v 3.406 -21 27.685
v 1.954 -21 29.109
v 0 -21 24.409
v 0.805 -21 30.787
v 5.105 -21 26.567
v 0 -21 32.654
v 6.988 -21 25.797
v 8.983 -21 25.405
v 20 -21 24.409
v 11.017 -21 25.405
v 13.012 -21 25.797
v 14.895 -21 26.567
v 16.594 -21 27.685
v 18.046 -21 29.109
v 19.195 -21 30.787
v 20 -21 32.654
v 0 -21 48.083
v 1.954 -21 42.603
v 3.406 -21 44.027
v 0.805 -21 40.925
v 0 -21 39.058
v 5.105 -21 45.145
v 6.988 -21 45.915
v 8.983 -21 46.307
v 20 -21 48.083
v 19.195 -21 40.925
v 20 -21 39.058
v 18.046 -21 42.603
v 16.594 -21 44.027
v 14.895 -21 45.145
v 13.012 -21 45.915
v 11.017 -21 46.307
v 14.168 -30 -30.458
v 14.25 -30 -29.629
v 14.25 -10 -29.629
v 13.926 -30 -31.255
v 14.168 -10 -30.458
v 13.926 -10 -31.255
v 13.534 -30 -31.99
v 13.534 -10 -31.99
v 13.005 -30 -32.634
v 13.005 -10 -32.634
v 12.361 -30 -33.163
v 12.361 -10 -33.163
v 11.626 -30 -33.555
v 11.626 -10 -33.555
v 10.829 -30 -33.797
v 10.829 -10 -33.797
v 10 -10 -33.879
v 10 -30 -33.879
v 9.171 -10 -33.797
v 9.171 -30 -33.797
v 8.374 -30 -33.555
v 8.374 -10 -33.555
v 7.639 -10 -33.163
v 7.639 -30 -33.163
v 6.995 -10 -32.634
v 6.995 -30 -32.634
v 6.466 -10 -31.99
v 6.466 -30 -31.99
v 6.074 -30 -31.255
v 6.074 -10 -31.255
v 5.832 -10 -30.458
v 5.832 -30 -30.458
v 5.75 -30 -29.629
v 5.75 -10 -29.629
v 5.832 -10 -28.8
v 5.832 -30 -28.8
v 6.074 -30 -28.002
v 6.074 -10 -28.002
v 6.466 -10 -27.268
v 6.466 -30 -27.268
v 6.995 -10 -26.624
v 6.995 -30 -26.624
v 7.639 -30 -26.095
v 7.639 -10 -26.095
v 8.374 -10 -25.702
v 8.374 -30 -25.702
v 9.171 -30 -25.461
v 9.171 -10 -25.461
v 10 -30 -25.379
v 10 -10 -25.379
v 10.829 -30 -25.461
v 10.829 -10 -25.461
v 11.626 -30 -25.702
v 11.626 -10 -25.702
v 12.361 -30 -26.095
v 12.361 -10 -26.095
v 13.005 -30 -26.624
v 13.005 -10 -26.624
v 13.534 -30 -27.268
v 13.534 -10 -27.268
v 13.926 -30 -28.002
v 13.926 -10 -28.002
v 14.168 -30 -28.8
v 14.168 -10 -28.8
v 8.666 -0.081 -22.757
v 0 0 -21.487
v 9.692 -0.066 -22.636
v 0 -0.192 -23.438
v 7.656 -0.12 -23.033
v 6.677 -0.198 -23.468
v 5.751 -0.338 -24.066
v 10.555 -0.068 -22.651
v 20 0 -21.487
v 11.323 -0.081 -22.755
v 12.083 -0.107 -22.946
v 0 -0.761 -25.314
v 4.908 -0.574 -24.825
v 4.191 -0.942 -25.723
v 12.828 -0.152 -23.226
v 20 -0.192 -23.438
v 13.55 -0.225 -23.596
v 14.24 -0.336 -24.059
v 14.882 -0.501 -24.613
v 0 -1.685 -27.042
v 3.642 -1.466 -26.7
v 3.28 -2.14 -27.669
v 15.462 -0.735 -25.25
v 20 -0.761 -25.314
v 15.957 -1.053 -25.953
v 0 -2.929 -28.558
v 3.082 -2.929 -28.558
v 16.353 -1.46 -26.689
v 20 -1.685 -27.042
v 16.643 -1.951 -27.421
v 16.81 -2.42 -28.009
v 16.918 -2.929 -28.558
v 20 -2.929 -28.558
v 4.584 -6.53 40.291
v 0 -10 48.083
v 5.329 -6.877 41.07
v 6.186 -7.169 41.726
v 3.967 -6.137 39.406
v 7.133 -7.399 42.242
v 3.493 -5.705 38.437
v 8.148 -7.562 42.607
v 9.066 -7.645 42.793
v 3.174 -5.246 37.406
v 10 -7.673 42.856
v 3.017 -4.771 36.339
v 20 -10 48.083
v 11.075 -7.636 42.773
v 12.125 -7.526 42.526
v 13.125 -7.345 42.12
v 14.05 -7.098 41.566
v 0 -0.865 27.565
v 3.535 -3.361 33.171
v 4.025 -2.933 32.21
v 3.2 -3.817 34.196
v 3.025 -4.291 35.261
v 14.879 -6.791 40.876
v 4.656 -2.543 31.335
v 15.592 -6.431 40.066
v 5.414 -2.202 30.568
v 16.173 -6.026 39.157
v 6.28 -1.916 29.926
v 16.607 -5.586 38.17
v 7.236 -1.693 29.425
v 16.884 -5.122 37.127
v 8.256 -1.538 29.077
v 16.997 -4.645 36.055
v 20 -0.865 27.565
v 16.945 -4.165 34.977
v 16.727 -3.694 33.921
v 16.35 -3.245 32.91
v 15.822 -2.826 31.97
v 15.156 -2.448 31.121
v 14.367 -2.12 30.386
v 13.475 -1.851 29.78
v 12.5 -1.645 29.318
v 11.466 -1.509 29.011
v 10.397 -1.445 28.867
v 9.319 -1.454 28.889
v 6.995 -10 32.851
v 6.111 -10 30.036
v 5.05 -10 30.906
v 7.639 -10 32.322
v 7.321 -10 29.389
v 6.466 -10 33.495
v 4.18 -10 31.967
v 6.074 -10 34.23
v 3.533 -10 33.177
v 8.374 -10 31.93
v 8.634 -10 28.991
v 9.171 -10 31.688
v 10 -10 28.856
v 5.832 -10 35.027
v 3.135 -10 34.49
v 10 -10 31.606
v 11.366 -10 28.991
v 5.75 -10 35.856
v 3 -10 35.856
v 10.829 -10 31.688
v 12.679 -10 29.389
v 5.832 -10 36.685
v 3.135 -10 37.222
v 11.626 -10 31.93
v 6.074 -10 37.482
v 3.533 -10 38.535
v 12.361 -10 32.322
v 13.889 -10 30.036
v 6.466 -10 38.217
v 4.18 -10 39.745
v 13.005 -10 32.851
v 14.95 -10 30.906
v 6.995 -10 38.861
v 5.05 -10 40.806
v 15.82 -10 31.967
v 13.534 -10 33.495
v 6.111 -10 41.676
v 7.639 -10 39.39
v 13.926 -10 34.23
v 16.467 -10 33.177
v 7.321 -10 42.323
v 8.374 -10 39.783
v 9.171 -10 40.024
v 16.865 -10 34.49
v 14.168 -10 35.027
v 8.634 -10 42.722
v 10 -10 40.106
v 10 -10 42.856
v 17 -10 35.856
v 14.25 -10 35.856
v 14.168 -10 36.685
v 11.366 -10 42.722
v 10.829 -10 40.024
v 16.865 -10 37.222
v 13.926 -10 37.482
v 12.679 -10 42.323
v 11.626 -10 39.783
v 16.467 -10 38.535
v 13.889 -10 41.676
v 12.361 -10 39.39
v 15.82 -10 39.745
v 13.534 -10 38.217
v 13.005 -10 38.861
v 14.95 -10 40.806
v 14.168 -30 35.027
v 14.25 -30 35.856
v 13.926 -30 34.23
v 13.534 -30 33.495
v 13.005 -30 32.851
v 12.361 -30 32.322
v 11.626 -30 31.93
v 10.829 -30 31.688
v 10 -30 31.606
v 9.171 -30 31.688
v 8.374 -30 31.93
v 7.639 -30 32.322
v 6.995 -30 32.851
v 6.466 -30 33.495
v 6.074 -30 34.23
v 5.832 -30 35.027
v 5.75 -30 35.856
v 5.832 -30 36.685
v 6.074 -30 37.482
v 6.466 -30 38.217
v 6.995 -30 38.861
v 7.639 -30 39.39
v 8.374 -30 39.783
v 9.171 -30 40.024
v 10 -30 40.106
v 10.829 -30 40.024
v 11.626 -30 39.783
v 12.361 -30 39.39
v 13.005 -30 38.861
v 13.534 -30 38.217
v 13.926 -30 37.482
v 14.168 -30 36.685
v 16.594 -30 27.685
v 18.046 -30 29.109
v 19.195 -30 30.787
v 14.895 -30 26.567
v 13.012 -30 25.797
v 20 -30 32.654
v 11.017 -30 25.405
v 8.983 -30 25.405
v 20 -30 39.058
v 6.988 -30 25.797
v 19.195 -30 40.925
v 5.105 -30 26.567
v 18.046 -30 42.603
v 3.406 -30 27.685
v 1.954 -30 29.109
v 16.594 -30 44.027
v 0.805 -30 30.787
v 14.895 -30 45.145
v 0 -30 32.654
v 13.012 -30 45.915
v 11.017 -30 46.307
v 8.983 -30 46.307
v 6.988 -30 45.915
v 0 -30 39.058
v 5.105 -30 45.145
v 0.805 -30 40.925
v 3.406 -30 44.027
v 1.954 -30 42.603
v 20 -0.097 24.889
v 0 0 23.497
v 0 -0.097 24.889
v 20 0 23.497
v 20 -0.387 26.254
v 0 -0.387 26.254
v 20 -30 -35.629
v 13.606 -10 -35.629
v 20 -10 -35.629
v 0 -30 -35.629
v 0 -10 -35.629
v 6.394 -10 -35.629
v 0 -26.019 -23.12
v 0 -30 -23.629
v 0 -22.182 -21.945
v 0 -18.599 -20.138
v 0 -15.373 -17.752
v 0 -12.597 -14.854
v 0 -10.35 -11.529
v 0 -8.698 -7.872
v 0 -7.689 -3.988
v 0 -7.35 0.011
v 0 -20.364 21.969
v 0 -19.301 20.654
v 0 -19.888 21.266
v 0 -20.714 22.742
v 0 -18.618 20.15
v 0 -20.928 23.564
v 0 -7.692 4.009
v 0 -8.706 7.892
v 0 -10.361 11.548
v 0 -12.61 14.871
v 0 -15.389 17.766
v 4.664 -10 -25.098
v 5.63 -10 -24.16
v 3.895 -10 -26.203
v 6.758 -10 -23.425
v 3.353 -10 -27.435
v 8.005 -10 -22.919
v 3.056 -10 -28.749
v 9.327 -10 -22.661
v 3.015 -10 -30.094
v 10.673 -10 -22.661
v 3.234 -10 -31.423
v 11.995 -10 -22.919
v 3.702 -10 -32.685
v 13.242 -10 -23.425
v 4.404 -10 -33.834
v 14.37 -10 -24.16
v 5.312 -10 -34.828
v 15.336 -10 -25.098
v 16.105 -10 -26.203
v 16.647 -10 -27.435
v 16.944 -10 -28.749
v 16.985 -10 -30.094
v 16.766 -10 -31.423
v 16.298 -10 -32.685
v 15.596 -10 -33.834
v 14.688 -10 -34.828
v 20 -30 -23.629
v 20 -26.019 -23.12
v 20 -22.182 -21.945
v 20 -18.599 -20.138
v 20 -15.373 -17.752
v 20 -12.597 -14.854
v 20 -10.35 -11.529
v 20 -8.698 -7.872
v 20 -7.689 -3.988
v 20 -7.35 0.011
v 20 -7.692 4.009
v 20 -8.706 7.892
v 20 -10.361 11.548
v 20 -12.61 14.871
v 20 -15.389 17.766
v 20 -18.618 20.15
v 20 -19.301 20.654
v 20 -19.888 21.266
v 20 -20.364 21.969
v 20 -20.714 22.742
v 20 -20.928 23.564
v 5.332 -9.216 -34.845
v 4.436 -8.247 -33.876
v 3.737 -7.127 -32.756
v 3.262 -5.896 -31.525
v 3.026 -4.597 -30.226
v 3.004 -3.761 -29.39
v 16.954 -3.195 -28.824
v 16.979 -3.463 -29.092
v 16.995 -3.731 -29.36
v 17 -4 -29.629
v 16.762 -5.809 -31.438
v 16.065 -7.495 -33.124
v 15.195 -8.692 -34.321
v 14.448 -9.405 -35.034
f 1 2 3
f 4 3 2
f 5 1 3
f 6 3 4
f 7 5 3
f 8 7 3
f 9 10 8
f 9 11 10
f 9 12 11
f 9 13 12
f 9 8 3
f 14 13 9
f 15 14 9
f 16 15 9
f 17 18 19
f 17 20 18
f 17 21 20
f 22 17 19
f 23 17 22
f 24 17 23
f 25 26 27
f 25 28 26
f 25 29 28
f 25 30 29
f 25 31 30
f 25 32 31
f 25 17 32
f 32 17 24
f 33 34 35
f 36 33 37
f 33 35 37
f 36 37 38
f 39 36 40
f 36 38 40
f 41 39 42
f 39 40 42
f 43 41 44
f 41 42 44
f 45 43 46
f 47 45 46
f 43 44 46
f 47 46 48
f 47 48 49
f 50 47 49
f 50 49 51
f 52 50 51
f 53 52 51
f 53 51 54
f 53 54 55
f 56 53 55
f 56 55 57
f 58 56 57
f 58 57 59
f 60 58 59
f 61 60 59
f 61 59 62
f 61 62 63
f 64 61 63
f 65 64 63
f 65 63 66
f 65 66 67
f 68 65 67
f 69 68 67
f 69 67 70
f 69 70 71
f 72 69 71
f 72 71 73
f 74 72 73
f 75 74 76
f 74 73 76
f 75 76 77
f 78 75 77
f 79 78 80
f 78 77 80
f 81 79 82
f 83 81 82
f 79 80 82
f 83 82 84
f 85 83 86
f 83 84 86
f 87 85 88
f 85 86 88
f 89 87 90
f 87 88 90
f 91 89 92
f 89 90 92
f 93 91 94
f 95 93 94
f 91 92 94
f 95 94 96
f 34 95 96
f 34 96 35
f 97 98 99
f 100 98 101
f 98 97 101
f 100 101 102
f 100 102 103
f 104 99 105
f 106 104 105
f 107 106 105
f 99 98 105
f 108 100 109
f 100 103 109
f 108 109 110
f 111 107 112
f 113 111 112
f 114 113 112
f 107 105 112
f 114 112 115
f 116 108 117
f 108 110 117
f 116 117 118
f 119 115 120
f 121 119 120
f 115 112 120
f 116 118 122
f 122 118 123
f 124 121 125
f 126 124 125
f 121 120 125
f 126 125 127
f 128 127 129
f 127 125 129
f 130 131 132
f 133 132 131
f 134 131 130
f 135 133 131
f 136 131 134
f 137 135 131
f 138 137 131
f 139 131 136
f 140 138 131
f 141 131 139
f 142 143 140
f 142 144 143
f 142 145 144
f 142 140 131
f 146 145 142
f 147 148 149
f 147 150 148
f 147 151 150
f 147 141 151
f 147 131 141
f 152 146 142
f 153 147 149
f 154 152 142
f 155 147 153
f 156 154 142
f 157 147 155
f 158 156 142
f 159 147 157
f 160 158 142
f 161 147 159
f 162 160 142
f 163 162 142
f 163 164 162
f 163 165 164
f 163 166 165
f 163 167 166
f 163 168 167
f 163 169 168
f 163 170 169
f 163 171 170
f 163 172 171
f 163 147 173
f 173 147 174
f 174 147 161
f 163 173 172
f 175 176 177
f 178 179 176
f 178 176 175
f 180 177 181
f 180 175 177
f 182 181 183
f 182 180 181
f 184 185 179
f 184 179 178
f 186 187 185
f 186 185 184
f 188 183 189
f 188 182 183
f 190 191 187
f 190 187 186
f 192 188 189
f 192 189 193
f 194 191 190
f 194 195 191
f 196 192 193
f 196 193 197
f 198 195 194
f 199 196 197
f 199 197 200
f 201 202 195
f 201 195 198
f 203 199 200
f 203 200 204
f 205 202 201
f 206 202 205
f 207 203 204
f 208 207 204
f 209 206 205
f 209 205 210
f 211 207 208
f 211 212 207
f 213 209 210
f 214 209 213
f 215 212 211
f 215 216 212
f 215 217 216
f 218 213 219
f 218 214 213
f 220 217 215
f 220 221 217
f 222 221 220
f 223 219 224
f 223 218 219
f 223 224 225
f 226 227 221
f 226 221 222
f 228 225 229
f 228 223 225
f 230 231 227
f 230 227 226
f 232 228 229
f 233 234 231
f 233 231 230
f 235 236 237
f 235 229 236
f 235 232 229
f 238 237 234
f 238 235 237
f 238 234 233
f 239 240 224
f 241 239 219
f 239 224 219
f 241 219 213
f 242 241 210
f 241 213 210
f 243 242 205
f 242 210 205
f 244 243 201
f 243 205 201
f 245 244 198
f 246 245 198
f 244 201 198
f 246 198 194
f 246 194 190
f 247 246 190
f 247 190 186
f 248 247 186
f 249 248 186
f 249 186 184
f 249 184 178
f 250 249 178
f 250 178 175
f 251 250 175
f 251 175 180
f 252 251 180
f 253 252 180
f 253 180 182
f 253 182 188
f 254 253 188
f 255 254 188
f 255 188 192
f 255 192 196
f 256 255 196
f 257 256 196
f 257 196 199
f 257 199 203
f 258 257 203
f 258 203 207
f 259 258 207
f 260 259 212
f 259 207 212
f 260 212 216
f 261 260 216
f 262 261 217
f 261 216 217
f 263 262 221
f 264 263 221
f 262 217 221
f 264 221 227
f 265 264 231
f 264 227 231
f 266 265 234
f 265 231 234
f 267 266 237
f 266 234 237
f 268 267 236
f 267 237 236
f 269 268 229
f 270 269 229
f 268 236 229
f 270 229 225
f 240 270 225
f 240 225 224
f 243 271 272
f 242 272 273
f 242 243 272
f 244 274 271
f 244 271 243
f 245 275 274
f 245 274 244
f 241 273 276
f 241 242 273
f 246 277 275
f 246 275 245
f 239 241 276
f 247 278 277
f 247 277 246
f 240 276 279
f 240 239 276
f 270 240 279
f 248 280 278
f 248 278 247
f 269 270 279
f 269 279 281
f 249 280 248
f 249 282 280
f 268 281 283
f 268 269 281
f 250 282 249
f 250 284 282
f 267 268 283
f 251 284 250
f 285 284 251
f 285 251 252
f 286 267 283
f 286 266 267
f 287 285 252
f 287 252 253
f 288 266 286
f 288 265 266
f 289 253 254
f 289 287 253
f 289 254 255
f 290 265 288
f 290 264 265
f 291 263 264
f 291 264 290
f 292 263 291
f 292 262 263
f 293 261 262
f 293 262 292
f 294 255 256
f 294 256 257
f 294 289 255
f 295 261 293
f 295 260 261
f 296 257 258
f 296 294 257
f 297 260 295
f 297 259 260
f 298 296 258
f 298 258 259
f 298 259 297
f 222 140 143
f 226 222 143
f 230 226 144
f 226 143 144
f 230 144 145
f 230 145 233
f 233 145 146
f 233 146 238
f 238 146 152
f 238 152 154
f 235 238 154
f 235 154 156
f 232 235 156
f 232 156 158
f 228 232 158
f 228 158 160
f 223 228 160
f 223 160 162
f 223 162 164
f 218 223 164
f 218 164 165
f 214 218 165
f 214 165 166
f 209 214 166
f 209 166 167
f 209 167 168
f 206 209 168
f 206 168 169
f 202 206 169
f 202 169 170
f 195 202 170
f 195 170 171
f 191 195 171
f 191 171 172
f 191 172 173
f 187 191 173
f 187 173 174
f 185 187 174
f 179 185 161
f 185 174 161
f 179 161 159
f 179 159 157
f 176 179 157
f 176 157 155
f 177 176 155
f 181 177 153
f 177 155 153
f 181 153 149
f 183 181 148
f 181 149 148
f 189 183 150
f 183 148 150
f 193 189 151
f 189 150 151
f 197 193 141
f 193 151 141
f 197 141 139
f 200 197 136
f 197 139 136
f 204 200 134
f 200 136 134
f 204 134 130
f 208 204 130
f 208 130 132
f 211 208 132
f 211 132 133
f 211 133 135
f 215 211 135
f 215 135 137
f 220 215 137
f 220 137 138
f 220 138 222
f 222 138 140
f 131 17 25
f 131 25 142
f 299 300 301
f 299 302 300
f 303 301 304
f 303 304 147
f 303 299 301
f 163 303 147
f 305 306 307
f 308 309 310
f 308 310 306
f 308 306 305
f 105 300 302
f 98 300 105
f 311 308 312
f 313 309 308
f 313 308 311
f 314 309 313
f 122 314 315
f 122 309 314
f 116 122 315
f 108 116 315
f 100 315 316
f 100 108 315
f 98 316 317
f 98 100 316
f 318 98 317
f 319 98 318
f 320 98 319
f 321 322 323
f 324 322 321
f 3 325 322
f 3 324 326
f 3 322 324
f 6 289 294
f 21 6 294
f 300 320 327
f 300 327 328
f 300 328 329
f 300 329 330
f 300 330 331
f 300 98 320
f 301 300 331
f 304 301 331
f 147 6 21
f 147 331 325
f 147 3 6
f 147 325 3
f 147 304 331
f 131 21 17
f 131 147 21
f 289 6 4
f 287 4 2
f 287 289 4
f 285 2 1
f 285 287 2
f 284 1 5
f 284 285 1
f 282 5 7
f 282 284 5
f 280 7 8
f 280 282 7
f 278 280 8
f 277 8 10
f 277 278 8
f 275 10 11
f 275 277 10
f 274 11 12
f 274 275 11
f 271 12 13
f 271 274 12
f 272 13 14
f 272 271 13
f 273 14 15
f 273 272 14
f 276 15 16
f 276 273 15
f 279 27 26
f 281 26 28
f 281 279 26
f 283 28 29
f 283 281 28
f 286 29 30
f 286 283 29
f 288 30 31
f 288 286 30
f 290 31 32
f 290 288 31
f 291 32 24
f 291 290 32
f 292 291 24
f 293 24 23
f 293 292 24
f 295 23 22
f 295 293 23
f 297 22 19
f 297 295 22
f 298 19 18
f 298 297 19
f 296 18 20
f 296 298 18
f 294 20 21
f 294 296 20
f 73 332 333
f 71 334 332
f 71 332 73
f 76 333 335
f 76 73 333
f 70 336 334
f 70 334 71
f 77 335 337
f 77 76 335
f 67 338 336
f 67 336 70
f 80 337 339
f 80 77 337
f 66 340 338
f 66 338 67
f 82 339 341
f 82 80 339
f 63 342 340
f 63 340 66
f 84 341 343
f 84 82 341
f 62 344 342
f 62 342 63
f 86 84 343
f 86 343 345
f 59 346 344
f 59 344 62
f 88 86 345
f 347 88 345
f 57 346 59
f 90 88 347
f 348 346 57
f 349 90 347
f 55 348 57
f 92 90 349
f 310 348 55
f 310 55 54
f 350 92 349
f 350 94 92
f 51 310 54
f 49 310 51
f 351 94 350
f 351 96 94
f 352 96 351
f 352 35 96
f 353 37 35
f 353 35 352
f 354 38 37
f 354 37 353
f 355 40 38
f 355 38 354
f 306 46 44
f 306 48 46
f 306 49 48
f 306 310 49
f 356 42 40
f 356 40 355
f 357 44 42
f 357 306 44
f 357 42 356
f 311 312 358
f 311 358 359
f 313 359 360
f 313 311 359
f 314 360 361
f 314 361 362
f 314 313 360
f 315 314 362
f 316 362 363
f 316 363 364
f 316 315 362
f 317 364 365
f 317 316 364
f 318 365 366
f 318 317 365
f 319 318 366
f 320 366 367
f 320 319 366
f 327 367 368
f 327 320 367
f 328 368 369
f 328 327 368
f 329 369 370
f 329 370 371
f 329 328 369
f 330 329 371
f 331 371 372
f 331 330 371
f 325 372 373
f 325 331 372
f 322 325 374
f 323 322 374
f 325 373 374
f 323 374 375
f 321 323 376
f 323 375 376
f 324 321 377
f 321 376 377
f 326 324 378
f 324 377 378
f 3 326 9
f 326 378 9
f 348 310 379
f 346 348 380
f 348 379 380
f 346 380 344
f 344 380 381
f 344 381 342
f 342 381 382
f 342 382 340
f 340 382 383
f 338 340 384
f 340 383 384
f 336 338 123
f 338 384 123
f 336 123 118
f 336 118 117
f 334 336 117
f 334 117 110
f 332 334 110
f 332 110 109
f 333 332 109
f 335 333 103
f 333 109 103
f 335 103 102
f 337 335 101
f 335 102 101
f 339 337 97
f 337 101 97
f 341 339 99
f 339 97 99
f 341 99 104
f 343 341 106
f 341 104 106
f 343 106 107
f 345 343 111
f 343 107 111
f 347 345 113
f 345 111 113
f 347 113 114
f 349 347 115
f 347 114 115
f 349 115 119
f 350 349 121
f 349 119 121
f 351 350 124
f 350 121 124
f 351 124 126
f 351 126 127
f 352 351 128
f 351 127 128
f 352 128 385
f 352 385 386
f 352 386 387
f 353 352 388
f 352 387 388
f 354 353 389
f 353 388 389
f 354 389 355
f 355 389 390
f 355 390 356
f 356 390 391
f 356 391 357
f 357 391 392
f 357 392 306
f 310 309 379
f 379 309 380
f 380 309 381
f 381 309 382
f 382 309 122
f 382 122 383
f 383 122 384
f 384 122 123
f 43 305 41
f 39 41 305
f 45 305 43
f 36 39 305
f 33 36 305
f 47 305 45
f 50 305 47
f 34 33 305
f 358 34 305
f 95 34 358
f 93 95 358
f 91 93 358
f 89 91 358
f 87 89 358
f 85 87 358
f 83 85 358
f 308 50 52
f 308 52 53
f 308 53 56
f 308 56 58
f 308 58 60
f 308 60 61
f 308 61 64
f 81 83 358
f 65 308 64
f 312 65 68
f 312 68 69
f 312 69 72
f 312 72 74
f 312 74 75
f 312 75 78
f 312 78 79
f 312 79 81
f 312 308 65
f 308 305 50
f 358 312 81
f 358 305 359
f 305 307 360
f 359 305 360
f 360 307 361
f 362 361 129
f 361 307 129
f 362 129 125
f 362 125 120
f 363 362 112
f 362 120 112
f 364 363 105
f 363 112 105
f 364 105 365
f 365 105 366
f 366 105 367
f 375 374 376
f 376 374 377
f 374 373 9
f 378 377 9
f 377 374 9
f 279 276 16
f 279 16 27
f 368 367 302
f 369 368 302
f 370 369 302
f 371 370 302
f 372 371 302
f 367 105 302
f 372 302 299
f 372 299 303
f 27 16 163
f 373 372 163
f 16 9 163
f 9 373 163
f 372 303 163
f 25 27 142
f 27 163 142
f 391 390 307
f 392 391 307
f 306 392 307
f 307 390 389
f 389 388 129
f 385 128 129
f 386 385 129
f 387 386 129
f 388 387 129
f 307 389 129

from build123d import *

# Parameters (mm, degrees)
BOSS_EXTRUDE1_DEPTH        = 20
CHAMFER1_SIZE              = 10
CHAMFER2_SIZE              = 10
CHAMFER2_SIZE2             = 22.460367739
FILLET2_R                  = 10
FILLET3_R                  = 5
F_8_5_8_5_DIAMETER_HOLE1_D = 8.5
SKETCH6_R                  = 7
CUT_EXTRUDE1_DEPTH         = 10
SKETCH7_R                  = 22.103989718
SKETCH7_R_2                = 10.5
CUT_EXTRUDE2_DEPTH         = 9


with BuildPart() as part:
    # Sketch1 → Boss-Extrude1 (new body)
    with BuildSketch(Plane(origin=(0, 0, 0), x_dir=(0, 0, -1), z_dir=(1, 0, 0))):
        with BuildLine():
            Line((-35.628848893, 0), (35.628848893, 0))
            Line((35.628848893, 0), (35.628848893, -30))
            Line((35.628848893, -30), (23.628848893, -30))
            ThreePointArc((23.628848893, -30), (4.632142534, -7.808067016), (-21.431810469, -21))
            Line((-21.431810469, -21), (-24.628848893, -21))
            Line((-24.628848893, -21), (-24.628848893, -30))
            Line((-24.628848893, -30), (-48.083267238, -30))
            Line((-48.083267238, -30), (-48.083267238, 0))
            Line((-48.083267238, 0), (-35.628848893, 0))
        make_face()
    extrude(amount=BOSS_EXTRUDE1_DEPTH)

    # Chamfer1
    chamfer1_edges = [part.edges().sort_by_distance(p)[0] for p in [
        (10, 0, -35.628848893),
    ]]
    chamfer(chamfer1_edges, length=CHAMFER1_SIZE)

    # Chamfer2
    chamfer2_edges = [part.edges().sort_by_distance(p)[0] for p in [
        (10, 0, 48.083267238),
    ]]
    chamfer2_side = [part.faces().sort_by_distance(p)[0] for p in [
        (10, -15, 48.083267238),
    ]]
    chamfer(chamfer2_edges, length=CHAMFER2_SIZE, length2=CHAMFER2_SIZE2, reference=chamfer2_side[0])

    # Fillet2
    fillet2_edges = [part.edges().sort_by_distance(p)[0] for p in [
        (10, 0, -25.628848893),
        (10, 0, 25.622899499),
    ]]
    fillet(fillet2_edges, radius=FILLET2_R)

    # Fillet3
    fillet3_edges = [part.edges().sort_by_distance(p)[0] for p in [
        (10, -21, 21.431810469),
    ]]
    fillet(fillet3_edges, radius=FILLET3_R)

    # Ø8.5 (8.5) Diameter Hole1 (through all)
    with Locations(Plane(origin=(0, -30, 0), x_dir=(-1, 0, 0), z_dir=(0, -1, 0))):
        with Locations((-10, -35.856058066), (-10, 29.628848893)):
            Hole(F_8_5_8_5_DIAMETER_HOLE1_D / 2)

    # Sketch6 → Cut-Extrude1 (cut)
    with BuildSketch(Plane(origin=(0, 0, 0), x_dir=(1, 0, 0), z_dir=(0, 1, 0))):
        with Locations(Location((10, -35.856058066, 0), (0, 0, 270))):
            Circle(SKETCH6_R)
        with Locations((10, 29.628848893)):
            Circle(SKETCH6_R)
    extrude(amount=-CUT_EXTRUDE1_DEPTH, mode=Mode.SUBTRACT)

    # Sketch7 → Cut-Extrude2 (cut)
    with BuildSketch(Plane.XZ.offset(30)):
        with Locations((10, 35.856058066)):
            Circle(SKETCH7_R)
        with Locations((10, 35.856058066)):
            Circle(SKETCH7_R_2, mode=Mode.SUBTRACT)
    extrude(amount=-CUT_EXTRUDE2_DEPTH, mode=Mode.SUBTRACT)


solid = part.part
